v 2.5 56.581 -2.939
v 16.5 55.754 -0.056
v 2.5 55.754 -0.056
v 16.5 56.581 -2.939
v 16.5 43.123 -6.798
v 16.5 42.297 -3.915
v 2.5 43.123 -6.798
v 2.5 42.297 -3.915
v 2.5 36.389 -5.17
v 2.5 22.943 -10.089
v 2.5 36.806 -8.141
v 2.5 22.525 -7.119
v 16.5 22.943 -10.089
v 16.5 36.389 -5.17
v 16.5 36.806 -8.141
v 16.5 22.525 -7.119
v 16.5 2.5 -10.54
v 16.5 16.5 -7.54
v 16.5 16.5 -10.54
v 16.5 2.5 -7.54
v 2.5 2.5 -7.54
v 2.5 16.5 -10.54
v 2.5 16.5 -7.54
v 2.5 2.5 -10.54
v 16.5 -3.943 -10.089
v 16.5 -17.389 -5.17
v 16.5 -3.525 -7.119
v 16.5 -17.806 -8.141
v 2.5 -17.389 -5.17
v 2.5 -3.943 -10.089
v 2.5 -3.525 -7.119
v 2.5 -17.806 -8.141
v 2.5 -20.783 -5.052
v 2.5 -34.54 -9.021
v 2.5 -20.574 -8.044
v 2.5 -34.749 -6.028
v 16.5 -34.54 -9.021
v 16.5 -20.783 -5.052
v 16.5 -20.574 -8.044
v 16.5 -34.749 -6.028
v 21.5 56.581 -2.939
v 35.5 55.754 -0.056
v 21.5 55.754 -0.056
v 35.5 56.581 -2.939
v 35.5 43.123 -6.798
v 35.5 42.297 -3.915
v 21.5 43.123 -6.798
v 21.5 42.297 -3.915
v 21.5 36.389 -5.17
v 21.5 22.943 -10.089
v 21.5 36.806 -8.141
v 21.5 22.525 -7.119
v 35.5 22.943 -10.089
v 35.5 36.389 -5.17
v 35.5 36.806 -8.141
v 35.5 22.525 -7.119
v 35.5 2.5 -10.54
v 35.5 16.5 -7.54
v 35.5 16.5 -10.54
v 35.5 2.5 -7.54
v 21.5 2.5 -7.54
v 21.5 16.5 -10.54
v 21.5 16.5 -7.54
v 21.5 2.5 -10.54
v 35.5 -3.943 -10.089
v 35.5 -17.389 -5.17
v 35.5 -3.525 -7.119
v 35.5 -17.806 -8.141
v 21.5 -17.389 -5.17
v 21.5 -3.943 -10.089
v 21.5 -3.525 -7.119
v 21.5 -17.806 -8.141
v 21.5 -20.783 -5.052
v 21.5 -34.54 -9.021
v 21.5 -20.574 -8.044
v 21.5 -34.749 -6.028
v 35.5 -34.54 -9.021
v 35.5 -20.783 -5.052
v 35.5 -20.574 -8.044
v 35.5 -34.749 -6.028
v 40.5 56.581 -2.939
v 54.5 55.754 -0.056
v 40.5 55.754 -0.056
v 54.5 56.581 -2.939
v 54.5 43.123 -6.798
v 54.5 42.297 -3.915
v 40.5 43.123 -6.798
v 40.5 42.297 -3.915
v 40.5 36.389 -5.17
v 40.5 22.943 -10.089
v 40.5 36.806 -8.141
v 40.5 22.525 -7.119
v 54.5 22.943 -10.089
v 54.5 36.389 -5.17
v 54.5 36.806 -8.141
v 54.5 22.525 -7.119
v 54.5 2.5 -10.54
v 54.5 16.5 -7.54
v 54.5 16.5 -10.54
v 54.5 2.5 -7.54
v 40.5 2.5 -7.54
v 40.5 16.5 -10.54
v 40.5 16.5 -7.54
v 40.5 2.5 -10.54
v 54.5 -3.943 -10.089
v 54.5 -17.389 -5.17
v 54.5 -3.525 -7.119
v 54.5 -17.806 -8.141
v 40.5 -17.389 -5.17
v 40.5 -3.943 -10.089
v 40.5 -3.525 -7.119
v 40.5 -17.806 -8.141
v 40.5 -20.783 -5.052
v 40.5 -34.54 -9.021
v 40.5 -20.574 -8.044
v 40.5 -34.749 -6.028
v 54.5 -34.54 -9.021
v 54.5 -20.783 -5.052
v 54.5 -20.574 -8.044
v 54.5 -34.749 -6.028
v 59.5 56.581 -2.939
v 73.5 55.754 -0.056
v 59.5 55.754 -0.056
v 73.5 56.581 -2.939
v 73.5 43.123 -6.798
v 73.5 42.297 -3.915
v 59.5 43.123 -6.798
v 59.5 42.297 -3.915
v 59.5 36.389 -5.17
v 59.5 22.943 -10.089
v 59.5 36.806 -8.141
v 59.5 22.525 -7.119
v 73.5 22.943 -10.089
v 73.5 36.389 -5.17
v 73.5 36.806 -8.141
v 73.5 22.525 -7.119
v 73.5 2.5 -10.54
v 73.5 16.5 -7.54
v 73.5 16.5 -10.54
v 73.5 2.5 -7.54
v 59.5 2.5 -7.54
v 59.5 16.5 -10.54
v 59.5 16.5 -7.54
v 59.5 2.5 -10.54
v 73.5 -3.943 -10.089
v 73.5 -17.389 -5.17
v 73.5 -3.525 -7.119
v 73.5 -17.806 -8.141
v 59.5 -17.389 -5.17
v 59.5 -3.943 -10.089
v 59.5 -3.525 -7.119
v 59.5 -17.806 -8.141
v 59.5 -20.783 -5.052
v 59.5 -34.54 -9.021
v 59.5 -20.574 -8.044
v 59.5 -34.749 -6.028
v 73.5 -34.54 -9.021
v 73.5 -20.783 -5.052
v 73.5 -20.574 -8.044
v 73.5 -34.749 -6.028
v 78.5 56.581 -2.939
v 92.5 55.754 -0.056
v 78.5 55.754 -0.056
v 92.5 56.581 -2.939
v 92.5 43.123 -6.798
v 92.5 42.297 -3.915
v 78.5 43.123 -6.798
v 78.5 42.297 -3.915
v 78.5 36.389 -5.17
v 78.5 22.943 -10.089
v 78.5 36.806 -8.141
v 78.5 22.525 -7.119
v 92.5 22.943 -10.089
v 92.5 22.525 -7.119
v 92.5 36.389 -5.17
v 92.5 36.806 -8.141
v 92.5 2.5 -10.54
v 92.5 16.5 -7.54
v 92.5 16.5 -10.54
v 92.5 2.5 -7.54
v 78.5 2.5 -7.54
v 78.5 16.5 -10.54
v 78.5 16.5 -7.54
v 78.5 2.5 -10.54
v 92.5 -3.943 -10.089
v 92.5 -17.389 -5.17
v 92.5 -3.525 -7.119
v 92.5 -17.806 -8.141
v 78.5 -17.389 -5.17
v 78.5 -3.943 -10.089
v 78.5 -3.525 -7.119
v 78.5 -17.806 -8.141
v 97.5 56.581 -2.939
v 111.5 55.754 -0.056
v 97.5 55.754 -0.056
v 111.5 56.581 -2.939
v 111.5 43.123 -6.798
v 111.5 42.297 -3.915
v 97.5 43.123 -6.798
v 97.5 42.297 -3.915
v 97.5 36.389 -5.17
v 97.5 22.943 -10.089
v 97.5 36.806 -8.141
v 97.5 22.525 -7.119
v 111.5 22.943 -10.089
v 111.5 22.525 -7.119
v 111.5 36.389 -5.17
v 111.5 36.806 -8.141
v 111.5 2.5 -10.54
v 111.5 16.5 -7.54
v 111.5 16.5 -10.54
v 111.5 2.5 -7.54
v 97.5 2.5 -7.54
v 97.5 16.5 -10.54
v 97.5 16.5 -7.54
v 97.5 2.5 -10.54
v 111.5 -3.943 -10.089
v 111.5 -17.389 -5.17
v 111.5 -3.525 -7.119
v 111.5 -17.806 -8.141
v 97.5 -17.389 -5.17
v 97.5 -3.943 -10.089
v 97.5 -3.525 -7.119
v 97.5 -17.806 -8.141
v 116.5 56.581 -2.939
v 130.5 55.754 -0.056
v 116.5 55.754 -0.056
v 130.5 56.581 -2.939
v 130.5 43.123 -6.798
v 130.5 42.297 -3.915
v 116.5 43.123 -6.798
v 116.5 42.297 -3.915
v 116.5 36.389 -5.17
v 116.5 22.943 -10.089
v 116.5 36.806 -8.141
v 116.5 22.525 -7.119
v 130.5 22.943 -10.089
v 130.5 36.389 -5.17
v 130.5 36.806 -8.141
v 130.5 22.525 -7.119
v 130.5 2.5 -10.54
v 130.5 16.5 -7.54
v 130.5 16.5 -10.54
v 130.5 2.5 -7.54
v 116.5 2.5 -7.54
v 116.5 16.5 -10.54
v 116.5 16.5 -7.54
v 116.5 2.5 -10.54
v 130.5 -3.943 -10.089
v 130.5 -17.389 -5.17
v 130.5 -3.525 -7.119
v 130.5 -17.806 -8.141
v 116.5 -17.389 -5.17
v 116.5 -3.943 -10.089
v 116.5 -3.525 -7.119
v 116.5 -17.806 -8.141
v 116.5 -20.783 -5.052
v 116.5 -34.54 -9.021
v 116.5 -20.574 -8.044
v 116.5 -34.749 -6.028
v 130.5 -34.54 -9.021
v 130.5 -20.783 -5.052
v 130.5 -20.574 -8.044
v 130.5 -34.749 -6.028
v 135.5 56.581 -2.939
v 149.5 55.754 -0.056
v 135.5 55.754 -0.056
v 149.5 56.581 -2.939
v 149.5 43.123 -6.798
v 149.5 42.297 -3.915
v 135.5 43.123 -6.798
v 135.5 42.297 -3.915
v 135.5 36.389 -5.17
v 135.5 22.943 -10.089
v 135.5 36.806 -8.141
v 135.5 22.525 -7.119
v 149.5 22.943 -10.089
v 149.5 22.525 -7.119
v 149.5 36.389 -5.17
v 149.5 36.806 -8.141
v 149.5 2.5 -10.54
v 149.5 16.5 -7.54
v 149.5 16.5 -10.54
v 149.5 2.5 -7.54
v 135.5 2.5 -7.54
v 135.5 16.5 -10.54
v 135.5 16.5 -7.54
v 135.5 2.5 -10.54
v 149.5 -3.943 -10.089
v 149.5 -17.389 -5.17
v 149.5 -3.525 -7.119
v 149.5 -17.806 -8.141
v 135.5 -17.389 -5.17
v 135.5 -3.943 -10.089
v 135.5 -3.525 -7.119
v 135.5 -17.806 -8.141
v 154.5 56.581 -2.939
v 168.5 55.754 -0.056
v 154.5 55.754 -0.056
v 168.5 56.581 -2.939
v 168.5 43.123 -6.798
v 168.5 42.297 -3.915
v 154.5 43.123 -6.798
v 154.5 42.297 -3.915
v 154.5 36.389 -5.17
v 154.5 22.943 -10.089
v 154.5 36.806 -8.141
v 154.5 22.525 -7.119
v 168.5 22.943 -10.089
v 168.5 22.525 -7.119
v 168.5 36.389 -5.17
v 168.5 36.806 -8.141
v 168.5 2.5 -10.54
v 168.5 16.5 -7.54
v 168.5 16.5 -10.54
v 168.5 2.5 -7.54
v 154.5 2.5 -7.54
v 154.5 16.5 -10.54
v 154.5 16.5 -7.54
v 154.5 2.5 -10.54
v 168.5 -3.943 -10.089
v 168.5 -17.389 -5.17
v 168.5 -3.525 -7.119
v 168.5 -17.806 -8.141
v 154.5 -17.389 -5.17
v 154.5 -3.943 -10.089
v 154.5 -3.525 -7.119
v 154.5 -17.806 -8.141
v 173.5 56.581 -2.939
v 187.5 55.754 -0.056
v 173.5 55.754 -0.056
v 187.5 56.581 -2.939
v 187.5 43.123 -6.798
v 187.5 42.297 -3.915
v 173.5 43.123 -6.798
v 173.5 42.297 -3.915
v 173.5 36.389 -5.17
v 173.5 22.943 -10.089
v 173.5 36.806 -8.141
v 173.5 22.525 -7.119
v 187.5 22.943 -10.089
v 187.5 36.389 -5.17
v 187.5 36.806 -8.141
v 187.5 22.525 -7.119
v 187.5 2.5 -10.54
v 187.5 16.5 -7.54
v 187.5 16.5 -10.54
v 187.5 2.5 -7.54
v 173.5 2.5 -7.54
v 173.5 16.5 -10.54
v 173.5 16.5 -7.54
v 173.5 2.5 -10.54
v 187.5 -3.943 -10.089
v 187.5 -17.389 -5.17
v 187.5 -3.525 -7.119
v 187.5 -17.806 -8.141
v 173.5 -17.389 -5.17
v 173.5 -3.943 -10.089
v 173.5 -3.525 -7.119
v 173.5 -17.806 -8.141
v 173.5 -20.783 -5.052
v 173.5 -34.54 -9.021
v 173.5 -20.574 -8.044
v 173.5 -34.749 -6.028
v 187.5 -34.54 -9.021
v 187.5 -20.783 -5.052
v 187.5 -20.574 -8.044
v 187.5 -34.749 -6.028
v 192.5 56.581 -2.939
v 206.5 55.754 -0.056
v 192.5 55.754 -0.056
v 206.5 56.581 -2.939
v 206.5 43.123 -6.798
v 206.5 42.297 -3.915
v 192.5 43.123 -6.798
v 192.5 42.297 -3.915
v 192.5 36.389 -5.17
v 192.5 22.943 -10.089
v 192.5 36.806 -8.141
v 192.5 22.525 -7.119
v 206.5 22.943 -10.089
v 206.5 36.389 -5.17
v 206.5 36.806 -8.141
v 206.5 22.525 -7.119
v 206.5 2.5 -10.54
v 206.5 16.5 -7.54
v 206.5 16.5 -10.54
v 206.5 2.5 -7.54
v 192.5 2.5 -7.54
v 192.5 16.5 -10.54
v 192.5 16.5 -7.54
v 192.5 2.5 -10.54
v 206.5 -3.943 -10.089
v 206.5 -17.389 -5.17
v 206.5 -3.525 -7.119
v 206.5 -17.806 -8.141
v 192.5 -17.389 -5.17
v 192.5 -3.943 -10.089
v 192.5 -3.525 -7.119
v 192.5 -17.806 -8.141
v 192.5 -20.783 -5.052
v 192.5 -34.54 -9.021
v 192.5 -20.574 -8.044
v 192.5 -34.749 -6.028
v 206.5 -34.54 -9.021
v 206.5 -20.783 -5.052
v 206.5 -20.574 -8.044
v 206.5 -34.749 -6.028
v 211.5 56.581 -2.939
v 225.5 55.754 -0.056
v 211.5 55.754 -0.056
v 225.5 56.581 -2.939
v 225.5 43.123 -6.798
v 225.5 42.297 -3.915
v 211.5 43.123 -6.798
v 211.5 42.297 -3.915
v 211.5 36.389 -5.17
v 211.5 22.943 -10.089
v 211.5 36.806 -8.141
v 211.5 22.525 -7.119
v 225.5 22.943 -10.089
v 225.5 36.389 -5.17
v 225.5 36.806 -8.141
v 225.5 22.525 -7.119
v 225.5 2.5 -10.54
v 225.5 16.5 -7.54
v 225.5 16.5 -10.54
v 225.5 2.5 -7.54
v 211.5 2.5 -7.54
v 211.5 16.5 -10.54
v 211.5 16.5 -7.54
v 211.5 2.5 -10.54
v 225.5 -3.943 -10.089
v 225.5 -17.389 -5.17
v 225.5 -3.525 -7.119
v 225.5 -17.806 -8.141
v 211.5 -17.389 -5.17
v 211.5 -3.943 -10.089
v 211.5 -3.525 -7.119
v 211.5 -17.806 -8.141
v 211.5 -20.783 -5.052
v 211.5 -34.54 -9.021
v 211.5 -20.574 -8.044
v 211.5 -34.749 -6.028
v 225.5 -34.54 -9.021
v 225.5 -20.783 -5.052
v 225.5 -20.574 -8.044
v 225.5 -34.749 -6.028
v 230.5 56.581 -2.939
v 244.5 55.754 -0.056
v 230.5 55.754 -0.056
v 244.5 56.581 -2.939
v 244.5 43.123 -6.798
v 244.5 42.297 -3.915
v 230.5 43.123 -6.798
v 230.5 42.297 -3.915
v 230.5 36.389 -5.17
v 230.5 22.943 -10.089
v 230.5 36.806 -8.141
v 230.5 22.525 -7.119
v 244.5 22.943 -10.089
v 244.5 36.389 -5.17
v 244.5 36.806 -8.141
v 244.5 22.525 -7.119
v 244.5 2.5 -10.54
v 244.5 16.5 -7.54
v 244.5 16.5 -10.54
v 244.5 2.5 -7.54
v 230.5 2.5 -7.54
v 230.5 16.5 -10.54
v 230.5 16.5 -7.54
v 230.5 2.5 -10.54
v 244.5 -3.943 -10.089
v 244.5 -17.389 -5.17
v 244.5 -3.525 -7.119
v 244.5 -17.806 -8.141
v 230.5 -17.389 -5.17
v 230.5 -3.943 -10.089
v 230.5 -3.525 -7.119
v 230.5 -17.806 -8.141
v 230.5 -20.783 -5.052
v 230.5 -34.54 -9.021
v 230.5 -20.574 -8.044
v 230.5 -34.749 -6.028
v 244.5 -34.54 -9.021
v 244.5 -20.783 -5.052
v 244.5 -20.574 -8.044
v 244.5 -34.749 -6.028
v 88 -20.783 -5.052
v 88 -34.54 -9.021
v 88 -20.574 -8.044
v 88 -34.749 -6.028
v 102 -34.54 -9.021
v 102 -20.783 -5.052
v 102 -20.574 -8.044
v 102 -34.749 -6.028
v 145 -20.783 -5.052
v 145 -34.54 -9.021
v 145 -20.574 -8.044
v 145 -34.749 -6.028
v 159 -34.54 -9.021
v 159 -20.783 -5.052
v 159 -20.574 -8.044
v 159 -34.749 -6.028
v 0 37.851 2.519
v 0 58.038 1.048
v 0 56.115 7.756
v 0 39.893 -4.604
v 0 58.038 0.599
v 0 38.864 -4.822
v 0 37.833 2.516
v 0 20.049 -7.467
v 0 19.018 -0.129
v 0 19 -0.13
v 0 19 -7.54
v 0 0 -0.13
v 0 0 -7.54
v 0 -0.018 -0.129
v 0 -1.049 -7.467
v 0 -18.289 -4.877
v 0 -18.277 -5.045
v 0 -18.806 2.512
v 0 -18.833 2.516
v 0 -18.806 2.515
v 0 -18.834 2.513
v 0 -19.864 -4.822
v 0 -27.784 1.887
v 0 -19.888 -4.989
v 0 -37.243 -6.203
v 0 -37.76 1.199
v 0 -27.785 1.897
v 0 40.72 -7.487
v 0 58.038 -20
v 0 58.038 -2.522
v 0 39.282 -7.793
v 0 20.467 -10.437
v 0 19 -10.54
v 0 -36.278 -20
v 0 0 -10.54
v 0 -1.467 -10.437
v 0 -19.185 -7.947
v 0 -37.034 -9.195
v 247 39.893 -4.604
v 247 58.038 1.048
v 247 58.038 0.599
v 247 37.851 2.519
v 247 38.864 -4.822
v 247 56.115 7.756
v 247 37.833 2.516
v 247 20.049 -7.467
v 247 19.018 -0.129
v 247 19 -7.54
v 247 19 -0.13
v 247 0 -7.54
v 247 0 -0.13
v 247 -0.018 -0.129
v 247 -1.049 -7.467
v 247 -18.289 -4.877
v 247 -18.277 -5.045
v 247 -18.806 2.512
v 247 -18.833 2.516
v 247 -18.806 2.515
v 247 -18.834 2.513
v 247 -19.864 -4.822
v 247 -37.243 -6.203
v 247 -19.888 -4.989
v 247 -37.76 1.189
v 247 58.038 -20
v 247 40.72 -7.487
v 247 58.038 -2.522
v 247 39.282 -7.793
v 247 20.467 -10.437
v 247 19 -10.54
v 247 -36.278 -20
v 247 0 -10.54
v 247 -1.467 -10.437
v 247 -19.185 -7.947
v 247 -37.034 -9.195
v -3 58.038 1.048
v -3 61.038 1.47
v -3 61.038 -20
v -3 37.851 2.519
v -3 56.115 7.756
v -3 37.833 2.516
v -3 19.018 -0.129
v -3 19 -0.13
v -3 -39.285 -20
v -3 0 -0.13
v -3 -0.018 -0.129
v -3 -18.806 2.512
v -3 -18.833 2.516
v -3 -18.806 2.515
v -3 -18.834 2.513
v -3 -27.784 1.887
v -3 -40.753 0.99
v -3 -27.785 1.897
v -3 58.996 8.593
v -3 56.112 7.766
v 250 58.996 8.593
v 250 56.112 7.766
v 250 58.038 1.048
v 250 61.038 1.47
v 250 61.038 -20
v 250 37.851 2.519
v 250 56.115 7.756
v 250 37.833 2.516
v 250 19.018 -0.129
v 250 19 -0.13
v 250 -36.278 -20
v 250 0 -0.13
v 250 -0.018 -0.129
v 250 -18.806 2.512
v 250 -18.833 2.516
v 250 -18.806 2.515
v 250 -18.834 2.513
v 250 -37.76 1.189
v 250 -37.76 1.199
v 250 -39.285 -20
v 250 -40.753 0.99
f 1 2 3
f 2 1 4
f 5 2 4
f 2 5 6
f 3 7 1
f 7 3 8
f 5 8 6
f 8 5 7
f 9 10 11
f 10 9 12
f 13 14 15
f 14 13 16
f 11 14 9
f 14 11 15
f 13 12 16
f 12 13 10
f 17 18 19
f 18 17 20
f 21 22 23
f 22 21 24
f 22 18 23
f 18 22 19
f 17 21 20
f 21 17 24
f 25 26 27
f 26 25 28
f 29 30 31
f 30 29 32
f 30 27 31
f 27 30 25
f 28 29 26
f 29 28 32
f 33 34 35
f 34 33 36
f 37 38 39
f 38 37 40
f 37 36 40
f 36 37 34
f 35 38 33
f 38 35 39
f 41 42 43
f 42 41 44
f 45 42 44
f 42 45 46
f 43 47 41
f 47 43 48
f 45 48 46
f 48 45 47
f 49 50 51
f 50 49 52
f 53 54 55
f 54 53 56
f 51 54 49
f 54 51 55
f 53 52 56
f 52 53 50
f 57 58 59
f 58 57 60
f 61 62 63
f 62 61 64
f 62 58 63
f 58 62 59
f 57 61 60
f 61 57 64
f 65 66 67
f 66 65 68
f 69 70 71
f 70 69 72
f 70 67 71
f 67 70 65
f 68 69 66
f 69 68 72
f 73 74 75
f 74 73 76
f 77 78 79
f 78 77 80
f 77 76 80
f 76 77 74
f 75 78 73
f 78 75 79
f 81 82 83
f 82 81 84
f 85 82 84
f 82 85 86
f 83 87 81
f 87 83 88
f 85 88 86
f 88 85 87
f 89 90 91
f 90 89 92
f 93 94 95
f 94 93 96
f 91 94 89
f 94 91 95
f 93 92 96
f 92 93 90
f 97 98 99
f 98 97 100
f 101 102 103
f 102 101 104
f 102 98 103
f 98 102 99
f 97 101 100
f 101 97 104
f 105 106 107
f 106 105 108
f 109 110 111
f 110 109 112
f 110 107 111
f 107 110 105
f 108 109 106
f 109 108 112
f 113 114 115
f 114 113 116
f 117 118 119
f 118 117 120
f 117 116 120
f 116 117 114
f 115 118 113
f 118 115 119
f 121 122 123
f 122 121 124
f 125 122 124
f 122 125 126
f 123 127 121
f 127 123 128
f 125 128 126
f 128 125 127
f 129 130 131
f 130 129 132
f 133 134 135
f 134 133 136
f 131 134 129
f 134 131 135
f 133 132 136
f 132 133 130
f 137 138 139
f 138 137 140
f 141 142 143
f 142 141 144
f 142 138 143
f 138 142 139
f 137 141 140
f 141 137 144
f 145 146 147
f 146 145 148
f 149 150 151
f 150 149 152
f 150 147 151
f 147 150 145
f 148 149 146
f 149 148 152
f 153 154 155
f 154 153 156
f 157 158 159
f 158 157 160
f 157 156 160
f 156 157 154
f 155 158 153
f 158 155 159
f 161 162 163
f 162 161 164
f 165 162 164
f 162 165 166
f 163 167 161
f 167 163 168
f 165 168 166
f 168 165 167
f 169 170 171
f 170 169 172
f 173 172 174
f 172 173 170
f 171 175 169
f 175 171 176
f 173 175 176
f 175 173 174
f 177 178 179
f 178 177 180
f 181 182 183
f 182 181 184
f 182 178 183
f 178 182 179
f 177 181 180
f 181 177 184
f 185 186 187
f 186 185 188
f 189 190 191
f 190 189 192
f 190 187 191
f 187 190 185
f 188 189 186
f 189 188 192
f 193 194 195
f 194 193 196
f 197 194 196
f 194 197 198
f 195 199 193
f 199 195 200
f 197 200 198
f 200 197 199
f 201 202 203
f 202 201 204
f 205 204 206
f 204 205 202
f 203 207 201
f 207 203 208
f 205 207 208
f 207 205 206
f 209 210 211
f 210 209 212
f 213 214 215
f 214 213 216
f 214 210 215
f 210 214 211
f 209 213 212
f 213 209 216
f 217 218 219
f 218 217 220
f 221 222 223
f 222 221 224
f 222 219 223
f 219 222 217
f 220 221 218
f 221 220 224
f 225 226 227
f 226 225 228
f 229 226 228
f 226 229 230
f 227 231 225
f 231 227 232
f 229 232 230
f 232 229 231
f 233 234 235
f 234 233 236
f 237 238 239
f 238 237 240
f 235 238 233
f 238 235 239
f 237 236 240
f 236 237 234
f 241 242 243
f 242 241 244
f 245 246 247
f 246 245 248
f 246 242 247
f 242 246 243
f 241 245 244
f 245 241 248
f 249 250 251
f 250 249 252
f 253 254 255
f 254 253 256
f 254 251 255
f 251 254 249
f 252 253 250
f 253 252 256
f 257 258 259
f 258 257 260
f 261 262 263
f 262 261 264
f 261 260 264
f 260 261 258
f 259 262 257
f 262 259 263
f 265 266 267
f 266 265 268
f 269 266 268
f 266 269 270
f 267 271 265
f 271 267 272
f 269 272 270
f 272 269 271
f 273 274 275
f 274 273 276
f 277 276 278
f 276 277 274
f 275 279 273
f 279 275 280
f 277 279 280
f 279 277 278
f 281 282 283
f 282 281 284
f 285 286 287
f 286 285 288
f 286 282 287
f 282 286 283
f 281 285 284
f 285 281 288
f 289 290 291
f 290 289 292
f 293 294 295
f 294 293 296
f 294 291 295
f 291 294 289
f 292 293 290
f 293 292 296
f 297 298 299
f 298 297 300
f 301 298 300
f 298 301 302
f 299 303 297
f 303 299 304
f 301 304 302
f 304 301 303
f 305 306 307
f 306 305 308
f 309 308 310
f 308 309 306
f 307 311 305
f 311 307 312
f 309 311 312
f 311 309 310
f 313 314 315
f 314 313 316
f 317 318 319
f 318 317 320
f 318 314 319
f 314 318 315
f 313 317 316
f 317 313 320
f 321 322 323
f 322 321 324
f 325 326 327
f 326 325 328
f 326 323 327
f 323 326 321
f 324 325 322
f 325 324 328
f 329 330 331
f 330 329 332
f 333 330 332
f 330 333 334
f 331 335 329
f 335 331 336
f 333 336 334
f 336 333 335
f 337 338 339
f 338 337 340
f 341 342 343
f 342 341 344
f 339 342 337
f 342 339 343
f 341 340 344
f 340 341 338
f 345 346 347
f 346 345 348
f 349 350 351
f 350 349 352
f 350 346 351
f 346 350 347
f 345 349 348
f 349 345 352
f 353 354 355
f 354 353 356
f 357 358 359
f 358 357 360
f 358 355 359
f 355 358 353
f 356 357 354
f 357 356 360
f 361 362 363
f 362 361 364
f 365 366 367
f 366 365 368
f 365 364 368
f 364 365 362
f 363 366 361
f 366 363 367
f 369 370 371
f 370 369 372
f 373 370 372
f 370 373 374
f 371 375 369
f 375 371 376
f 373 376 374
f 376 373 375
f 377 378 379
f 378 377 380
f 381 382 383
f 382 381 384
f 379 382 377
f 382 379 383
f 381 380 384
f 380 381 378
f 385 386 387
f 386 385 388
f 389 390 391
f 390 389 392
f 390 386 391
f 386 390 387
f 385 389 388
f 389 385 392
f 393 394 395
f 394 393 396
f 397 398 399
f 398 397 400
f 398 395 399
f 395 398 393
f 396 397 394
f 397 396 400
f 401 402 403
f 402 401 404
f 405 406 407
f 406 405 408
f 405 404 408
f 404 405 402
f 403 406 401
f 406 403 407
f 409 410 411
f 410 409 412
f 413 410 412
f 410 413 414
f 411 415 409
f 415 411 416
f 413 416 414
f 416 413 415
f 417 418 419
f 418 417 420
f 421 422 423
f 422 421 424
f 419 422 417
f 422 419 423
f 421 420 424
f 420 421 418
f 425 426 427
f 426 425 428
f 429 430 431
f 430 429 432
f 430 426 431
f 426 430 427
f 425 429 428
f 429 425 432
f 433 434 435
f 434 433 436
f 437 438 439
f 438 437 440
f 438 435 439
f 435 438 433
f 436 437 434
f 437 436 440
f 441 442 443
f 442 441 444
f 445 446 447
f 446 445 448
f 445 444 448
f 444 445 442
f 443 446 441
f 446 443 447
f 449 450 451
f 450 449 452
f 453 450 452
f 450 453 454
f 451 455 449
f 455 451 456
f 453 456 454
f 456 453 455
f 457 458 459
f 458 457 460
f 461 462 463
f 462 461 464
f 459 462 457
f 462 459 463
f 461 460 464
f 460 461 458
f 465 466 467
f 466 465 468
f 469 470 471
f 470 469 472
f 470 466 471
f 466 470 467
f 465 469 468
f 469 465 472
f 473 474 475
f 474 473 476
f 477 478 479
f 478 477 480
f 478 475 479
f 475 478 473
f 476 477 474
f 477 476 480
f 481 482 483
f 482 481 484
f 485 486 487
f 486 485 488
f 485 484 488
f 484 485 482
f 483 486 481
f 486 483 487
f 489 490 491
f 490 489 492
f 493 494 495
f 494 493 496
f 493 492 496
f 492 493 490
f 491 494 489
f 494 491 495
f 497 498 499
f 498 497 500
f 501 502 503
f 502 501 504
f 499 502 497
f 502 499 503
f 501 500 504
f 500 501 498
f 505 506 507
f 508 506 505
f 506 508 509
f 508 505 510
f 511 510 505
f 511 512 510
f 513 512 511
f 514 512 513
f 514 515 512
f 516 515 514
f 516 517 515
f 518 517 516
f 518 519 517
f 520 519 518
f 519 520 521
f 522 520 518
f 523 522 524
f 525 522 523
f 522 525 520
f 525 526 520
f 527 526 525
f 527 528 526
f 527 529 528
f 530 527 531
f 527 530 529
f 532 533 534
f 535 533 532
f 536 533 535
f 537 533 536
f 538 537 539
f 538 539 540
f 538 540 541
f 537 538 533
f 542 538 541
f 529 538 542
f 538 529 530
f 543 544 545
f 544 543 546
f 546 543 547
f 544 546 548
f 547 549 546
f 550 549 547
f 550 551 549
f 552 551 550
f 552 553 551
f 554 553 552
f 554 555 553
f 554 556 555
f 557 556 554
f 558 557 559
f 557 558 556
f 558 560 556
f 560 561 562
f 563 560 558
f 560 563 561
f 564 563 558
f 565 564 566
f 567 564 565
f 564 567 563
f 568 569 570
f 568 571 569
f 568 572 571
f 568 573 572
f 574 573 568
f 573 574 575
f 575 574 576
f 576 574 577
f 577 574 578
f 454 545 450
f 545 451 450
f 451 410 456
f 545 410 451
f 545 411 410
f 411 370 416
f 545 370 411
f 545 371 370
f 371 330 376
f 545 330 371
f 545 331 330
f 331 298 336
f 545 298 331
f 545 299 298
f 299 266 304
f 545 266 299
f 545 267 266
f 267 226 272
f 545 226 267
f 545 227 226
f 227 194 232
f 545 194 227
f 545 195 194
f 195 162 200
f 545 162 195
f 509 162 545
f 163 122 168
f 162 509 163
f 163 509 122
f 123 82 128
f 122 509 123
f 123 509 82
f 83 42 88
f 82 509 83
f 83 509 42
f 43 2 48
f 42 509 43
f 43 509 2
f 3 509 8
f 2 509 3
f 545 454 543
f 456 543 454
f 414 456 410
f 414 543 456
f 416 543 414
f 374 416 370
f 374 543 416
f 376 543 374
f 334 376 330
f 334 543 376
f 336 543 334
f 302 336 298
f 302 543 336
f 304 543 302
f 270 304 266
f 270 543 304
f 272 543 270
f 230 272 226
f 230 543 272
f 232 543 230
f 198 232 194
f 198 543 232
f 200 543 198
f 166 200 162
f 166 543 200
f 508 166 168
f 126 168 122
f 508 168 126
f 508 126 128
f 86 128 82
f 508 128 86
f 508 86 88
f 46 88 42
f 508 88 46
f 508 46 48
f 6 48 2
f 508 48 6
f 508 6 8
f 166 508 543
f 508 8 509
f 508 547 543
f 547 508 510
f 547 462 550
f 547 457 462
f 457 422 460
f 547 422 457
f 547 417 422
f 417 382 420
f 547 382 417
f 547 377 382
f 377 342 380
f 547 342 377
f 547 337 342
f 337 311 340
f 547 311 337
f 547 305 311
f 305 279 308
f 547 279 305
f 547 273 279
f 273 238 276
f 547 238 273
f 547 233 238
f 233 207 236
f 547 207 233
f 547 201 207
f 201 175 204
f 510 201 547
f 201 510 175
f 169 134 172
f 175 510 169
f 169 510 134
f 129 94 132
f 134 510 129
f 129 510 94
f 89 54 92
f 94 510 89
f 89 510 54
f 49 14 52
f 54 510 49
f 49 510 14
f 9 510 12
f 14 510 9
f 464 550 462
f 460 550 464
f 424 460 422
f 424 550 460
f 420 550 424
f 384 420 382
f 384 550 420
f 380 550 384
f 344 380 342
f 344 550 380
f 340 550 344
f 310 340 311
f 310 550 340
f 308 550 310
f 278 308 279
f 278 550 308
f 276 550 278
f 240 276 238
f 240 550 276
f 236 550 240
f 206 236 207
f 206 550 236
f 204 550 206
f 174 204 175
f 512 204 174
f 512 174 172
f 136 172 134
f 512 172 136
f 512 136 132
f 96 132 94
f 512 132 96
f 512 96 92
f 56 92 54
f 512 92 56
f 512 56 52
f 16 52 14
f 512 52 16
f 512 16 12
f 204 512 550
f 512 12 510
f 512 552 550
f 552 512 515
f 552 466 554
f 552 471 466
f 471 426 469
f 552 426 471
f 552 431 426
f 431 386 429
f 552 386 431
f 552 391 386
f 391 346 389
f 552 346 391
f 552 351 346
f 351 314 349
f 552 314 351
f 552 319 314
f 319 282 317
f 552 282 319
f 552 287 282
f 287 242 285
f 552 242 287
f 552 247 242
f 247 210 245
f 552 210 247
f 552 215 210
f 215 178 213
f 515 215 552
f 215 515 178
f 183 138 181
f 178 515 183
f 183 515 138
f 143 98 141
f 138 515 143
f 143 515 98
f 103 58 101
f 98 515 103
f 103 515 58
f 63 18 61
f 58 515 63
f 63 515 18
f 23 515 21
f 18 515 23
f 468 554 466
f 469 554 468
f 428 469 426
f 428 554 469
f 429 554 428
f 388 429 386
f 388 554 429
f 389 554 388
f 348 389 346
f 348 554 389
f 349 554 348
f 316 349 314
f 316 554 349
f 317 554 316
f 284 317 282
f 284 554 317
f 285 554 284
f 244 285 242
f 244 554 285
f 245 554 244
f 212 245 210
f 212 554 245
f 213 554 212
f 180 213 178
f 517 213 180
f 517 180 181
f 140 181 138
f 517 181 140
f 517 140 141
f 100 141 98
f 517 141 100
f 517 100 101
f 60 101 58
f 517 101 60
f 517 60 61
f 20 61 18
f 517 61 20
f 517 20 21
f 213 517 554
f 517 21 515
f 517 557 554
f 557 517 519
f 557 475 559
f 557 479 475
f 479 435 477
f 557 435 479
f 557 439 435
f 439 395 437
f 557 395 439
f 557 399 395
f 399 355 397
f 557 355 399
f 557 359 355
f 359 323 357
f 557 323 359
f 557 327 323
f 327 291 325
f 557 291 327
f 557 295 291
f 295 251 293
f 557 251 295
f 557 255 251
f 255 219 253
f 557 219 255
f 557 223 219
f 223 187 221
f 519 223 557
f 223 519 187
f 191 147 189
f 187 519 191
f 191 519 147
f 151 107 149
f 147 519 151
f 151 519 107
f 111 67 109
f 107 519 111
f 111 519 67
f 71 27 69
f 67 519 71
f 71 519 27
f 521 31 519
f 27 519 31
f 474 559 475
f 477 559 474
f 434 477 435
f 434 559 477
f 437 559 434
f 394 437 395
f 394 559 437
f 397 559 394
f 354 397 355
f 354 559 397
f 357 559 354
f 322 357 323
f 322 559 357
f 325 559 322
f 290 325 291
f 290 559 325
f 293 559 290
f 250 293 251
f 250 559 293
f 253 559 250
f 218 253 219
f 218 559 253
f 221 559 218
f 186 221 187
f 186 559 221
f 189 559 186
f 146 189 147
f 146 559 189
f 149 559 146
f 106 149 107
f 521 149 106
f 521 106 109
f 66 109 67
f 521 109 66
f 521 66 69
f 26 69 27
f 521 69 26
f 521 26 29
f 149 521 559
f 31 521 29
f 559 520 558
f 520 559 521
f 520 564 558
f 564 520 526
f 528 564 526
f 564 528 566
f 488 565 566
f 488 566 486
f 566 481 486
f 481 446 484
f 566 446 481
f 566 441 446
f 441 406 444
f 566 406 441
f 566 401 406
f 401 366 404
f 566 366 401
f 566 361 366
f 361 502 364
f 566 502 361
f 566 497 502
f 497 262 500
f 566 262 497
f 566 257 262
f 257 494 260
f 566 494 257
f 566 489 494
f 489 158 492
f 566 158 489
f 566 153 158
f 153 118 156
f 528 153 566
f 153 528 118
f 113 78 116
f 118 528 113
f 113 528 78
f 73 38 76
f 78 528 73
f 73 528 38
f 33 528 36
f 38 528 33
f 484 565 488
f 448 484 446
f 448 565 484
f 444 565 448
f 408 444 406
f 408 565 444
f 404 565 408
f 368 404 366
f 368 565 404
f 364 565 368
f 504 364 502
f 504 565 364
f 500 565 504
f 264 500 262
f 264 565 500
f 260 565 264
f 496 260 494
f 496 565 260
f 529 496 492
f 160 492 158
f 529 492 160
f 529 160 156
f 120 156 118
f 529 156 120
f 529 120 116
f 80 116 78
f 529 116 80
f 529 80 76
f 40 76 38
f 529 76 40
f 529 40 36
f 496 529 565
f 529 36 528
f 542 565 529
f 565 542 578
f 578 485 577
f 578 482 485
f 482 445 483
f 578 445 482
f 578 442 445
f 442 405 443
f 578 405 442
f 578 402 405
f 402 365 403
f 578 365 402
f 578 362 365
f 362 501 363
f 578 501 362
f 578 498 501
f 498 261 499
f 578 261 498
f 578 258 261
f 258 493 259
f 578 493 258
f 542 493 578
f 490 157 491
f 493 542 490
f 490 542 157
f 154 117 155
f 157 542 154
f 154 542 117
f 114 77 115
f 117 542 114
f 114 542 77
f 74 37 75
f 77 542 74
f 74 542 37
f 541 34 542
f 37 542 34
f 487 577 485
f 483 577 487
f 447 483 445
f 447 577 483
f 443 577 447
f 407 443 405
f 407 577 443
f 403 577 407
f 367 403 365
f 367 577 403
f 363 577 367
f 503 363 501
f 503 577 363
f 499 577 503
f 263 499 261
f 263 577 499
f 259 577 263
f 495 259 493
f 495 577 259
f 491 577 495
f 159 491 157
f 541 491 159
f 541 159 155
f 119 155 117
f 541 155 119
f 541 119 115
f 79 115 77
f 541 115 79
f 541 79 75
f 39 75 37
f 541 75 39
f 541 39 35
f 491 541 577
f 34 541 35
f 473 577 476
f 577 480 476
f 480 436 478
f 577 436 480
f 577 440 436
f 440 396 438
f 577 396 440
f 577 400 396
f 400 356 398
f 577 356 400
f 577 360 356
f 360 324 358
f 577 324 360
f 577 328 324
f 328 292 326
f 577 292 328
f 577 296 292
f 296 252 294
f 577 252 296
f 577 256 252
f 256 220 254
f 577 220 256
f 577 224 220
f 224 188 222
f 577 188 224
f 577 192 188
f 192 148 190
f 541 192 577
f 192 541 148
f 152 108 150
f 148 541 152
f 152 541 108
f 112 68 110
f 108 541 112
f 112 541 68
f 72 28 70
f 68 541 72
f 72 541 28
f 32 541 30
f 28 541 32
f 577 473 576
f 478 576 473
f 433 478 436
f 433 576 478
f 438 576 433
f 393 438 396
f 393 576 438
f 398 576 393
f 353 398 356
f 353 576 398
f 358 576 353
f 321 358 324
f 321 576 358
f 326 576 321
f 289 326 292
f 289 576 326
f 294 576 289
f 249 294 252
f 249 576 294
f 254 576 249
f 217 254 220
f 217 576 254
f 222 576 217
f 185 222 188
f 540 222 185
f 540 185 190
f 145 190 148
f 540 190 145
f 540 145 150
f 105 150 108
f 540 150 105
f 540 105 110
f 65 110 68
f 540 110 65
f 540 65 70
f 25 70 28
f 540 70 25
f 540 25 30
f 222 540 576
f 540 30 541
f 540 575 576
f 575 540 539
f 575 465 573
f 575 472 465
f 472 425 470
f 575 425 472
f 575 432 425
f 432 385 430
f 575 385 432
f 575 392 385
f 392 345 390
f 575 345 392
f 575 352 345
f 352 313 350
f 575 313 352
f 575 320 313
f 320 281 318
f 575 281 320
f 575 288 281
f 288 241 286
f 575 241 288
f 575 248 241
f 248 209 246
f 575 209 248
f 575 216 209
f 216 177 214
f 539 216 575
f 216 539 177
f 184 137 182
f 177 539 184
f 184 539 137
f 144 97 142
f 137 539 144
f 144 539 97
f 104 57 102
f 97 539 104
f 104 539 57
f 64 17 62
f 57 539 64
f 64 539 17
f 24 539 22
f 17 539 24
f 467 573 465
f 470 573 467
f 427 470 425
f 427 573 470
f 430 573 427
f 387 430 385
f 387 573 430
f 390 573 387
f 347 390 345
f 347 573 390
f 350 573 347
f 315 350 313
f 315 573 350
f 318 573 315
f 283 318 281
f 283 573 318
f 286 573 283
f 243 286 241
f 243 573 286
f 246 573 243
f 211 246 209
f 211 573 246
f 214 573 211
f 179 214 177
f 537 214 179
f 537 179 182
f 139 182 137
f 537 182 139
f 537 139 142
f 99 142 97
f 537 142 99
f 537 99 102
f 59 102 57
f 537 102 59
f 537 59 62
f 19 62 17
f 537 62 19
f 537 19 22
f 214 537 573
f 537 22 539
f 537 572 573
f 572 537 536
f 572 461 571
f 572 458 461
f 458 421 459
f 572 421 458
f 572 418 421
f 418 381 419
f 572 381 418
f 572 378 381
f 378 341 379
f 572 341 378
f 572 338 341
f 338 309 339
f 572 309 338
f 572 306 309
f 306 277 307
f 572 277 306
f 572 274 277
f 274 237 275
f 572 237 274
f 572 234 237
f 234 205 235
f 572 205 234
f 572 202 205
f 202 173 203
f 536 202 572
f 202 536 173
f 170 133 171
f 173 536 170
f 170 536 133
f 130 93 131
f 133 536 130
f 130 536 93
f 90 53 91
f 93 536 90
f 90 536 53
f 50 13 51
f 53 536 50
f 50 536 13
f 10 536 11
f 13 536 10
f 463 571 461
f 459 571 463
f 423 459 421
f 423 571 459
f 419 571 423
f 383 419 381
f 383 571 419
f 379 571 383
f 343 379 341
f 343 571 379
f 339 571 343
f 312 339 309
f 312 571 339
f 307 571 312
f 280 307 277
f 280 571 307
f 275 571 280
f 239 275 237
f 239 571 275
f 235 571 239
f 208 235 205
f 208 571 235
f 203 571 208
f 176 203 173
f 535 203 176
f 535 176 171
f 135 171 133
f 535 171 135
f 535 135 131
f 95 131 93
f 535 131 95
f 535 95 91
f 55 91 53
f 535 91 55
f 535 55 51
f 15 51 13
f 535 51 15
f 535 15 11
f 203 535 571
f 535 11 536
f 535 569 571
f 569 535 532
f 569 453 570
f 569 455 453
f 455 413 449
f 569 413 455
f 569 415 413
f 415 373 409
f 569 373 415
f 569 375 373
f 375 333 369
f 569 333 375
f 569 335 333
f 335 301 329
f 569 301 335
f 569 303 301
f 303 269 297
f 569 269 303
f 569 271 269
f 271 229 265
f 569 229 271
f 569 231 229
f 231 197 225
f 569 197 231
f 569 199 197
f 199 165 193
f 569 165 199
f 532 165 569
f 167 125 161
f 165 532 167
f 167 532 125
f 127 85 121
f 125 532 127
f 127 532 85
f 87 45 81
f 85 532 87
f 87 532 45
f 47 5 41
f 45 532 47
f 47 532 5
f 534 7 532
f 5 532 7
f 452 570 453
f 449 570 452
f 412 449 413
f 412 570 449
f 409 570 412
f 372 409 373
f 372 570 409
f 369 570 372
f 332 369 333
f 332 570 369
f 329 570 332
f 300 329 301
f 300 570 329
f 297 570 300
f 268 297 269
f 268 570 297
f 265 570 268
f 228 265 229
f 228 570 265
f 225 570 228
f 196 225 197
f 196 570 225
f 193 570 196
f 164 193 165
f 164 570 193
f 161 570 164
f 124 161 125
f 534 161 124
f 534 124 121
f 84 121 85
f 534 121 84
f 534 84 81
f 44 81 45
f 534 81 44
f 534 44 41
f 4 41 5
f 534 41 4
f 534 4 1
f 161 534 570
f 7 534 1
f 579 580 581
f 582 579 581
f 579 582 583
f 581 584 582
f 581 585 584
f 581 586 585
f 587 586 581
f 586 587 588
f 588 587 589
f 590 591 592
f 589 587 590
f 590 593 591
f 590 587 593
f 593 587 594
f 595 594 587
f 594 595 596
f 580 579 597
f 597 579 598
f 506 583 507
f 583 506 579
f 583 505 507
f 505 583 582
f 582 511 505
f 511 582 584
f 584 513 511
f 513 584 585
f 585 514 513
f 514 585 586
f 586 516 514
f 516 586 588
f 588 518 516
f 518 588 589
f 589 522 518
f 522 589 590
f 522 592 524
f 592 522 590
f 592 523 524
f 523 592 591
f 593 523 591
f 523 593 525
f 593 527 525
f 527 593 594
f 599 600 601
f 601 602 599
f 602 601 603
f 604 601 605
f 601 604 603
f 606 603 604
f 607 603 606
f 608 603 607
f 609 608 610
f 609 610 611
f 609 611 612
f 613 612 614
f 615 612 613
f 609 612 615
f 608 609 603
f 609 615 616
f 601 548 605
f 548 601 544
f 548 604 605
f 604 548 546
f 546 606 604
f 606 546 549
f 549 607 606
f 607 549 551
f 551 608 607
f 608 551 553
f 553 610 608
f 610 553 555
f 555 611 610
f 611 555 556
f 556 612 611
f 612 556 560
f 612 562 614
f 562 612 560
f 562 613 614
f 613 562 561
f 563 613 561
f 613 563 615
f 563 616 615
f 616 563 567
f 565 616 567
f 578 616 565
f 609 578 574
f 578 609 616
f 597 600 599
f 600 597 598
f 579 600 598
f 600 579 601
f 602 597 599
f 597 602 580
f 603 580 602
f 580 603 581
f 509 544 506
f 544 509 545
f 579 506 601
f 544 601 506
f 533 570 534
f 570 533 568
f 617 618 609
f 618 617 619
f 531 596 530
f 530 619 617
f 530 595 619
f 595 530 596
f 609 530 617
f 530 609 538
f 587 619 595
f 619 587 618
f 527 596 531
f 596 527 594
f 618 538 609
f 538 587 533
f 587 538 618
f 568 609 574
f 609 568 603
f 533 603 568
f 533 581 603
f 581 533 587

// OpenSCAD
$fn = 20;
renderSwitches = false;

outWidth = 19;
inWidth = 14;
angle = 8;
thickness = 3;
height = 11;

numColumns = 13;
numRows = 5;

switchPlateToKeyCapDist = 7.41;
switchBottomToKeyCapDist = 14.1;
switchBottomToPlateDist = switchBottomToKeyCapDist - switchPlateToKeyCapDist;
//switchPlateTo
verticalWallOffset = 0.12;
thumbOffset = 0;

//middlePlateHeight = 10;
middlePlateHeight = 9;
proMicroCaddyX = outWidth * (numColumns - 2.5);
proMicroCaddyWidth = 30;
proMicroPortHoleWidth = 3;
proMicroPortHoleLength = 21;
proMicroPortHoleHeight = 8;
proMicroPortOffset = 1.5;

bottomPlateHeight = 1;

bottomRowAngleMult = 1.5;

bottomWallOffset = 0.53;

//height + middle + bottom = 22(?)


keyRow3Trans = identityMatrix();

keyRow2Trans = translationMatrix(0, outWidth, 0) * xRotMatrix(angle);
keyRow1Trans = keyRow2Trans * translationMatrix(0, outWidth, 0) * xRotMatrix(angle);
    
keyRow4Trans = xRotMatrix(-angle) * translationMatrix(0, -outWidth, 0);
keyRow5Trans = keyRow4Trans * xRotMatrix(angle * bottomRowAngleMult) * translationMatrix(0, -outWidth, 0);

keyRowTransformations = [keyRow1Trans, keyRow2Trans, keyRow3Trans, keyRow4Trans, keyRow5Trans];


topCornerPos = keyRow1Trans * [0, outWidth + thickness, -switchPlateToKeyCapDist - verticalWallOffset, 1];
topCornerY = topCornerPos[1];
bottomCornerPos = keyRow5Trans * [0, 0, 0, 1];
bottomCornerY = bottomCornerPos[1];

innerKeyboardWidth = numColumns * outWidth;
innerKeyboardHeight = numRows * outWidth;

resetButtonOffset = 171;
resetButtonRadius = 3;
resetButtonHeight = 1;

screwHoleWidth = 1.3;
screwHoleBottomPlateWidth = 2.1;
screwHolePadding = 1;
topScrewHeight = thickness;

//translate([0, topCornerPos[1], topCornerPos[2]])
//cube(1);

//slicedKeyboard(-10, thickness + outWidth * 6 - 2.5 + 10);
//slicedKeyboard(thickness + outWidth * 6 - 2.5, 1000);


//proMicro();
//proMicroCaddy();
//


difference() {
    fullKeyboard();
    keyboardFloorCutter();
}


//resetButton();



//allSwitches("model");


//cuttableBottomFloor();

//keyboardWalls();



module cuttableBottomFloor() {
    projection(cut = true)
    translate([0, 0, height + middlePlateHeight + bottomPlateHeight / 2])
    keyboardFloor();
}


module resetButton() {
    translate([resetButtonOffset, topCornerY - thickness, -height - middlePlateHeight - resetButtonHeight + 0])
    rotate([0, 0, -90])
    import("button.stl", convexity=10);
}

module slicedKeyboard(offsetX, sliceWidth) {
    difference() {
        fullKeyboard();
        translate([offsetX, -500, -500])
        cube([sliceWidth, 1000, 1000]);
    }
    
    
}

module fullKeyboard() {
    union() {
    keyboardBase();
    keyboardWalls();
    //middleWalls();
    //screwHoles(screwHoleWidth, screwHolePadding, topScrewHeight, -height, 1, true);

    }
}

module keyboardFloor() {
    difference () {
        keyboardFloorBase();
        
        screwHoles(screwHoleBottomPlateWidth, screwHolePadding, 10, -height - middlePlateHeight - bottomPlateHeight - 5, 1, false, true);
        
        resetButton();

    }
}

module keyboardFloorBase() {
    topPos = keyRow1Trans * [0, outWidth + thickness, -switchPlateToKeyCapDist, 1];
    topY = topPos[1];
    echo(topY);
    bottomPos = keyRow5Trans * [0, 0, 0, 1];
    bottomY = bottomPos[1];
    echo(bottomY);
    
    width = numColumns * outWidth + thickness * 2;
    length = (topY - bottomY) + thickness;
    
    translate([-thickness, bottomY - thickness, - (height + middlePlateHeight + bottomPlateHeight)])
    cube([width, length, bottomPlateHeight]);
    
    //

}

module keyboardFloorCutter() {
    topPos = keyRow1Trans * [0, outWidth + thickness, -switchPlateToKeyCapDist, 1];
    topY = topPos[1];
    echo(topY);
    bottomPos = keyRow5Trans * [0, 0, 0, 1];
    bottomY = bottomPos[1];
    echo(bottomY);
    
    width = numColumns * outWidth + thickness * 20;
    length = (topY - bottomY) + thickness * 10;
    
    cutHeight = bottomPlateHeight + 100;
    translate([-thickness - 5, bottomY - thickness, - (height + middlePlateHeight + cutHeight)])
    cube([width, length, cutHeight]);
    
    //

}





module middleWalls() {
    tol = 0.3;
    union() {
        difference() {
            middleWallsBase();
            
            translate([proMicroCaddyX - proMicroPortHoleLength / 2, topCornerY - thickness - tol / 2, -height - middlePlateHeight - tol])
                cube([proMicroPortHoleLength, proMicroPortHoleWidth + tol, proMicroPortHoleHeight + tol]);
        } 
        
    translate([proMicroCaddyX, topCornerY - thickness, -height - middlePlateHeight])
        import("promicro-port-hole.stl", convexity=10);
        
        screwHoles(screwHoleWidth, screwHolePadding,, middlePlateHeight, -height - middlePlateHeight, 1);
    }
    
}

module middleWallsBase() {
    translate([0, 0, -height - middlePlateHeight])
    linear_extrude(height=middlePlateHeight)
    projection(cut=true)
    translate([0, 0, height-0.01])
    keyboardWalls();
}

function screwHoleXYpositions(halfWidth, middleScrewOffsetY) = [
        [halfWidth, bottomCornerY + halfWidth],
        [halfWidth, topCornerY - thickness - halfWidth],
        [innerKeyboardWidth - halfWidth, bottomCornerY + halfWidth],
        [innerKeyboardWidth - halfWidth, topCornerY - thickness - halfWidth],
        [4 * outWidth, - middleScrewOffsetY],
        [9 * outWidth, - middleScrewOffsetY],
        [4 * outWidth, outWidth + middleScrewOffsetY],
        [9 * outWidth, outWidth + middleScrewOffsetY],
        [innerKeyboardWidth / 2, bottomCornerY + halfWidth],
        [innerKeyboardWidth / 2, topCornerY - thickness - halfWidth]
];

module screwHoles(radius, padding, screwHeight, screwZ, middleScrewOffsetY, middleScrewsOnly, cylindersOnly) {
    holeWidth = (screwHoleWidth + screwHolePadding) * 2;
    halfWidth = holeWidth / 2;
    
    realZ = screwZ + screwHeight / 2;
    
    screwXYpositions = screwHoleXYpositions(halfWidth, middleScrewOffsetY);
    
    //TODO: clean code!!!!
    if (cylindersOnly) {
        screwHolesHelper(screwXYpositions, 0, 9, radius, padding, screwHeight, realZ, "cylinder", holeWidth / 2);
    } else {
    
        if (middleScrewsOnly) {
            screwHolesHelper(screwXYpositions, 4, 7, radius, padding, screwHeight, realZ, "cube", 0);
        } else {
            screwHolesHelper(screwXYpositions, 0, 9, radius, padding, screwHeight, realZ, "hole", 0);
        }
    }
}

module screwHolesBak(radius, padding, screwHeight, screwZ, middleScrewOffsetY, middleScrewsOnly, cylindersOnly) {
    holeWidth = (radius + padding) * 2;
    
    screwXYpositions = [
        [0, bottomCornerY],
        [0, topCornerY - thickness - holeWidth],
        [innerKeyboardWidth - holeWidth, bottomCornerY],
        [innerKeyboardWidth - holeWidth, topCornerY - thickness - holeWidth],
        [4 * outWidth - holeWidth / 2, -holeWidth / 2 - middleScrewOffsetY],
        [9 * outWidth - holeWidth / 2, -holeWidth / 2 - middleScrewOffsetY],
        [4 * outWidth - holeWidth / 2, outWidth + -holeWidth / 2 + middleScrewOffsetY],
        [9 * outWidth - holeWidth / 2, outWidth + -holeWidth / 2 + middleScrewOffsetY],
        [innerKeyboardWidth / 2 - holeWidth / 2, bottomCornerY],
        [innerKeyboardWidth / 2 - holeWidth / 2, topCornerY - thickness - holeWidth],
    ];
    
    if (cylindersOnly) {
        screwHolesHelper(screwXYpositions, 0, 9, radius, padding, screwHeight, screwZ, "cylinder", holeWidth / 2);
    } else {
    
        if (middleScrewsOnly) {
            screwHolesHelper(screwXYpositions, 4, 7, radius, padding, screwHeight, screwZ, "cube", 0);
        } else {
            screwHolesHelper(screwXYpositions, 0, 9, radius, padding, screwHeight, screwZ, "hole", 0);
        }
    }
}

module screwHolesHelper(screwXYpositions, start, end, radius, padding, screwHeight, screwZ, type, offsetXY) {
    for ( i = [start : end] ) {
        x = screwXYpositions[i][0];
        y = screwXYpositions[i][1];
        //z = -height - middlePlateHeight;
        translate([x + 0, y + 0, screwZ])
        if (type == "hole") {
            screwHole(radius, padding, screwHeight);
        } else if (type == "cube") {
            cubeWidth = (radius + padding) * 2;
            cube([cubeWidth, cubeWidth, screwHeight], center = true);
        } else if (type == "cylinder") {
            cylinder(h = screwHeight, r = radius, center = true);
        }
    }
}

module screwHole(innerRadius, padding, height) {
    difference() {
        cubeWidth = (innerRadius + padding) * 2;
        cube([cubeWidth, cubeWidth, height], center = true);
        
        //translate([cubeWidth / 2, cubeWidth /2, -1])
        cylinder(h = height + 2, r = innerRadius, center = true);
    }
    
}

module proMicroCaddy() {
    translate([proMicroCaddyX, topCornerY - thickness, -(height + middlePlateHeight)])
    rotate([0, 0, 0])
    import("promicro-caddy.stl", convexity=10);
    //import("promicro.stl", convexity=10);
}

/*
module proMicro() {
    translate([proMicroPortX, 47, -16])
    rotate([0, -180, 90])
    //import("promicro-caddy.stl", convexity=10);
    import("promicro.stl", convexity=10);
}*/

/*
module proMicro() {
    translate([proMicroPortX, 59, -12.5])
    rotate([0, 0, 180])
    //import("promicro-caddy.stl", convexity=10);
    import("promicro.stl", convexity=10);
}*/


module proMicro() {
    translate([proMicroCaddyX, topCornerY - thickness + proMicroPortOffset, -(height + middlePlateHeight) + 0])
    //rotate([180, 0, 0])
    //import("promicro-caddy.stl", convexity=10);
    import("promicro.stl", convexity=10);
}

module keyboardWalls() {
    topOffset = [0, -outWidth - thickness, 0, 1] * keyRow1Trans;
    echo("top offset:");
    echo(topOffset[2]);
    //moveHeight = height - topOffset[2];
    moveHeight = height + 100;
    
    difference() {
        keyboardWallsUnsliced(height * 2);
        translate([-1000, -1000, -moveHeight - 100])
        cube([2000, 2000, 100]);
    }
}

module keyboardWallsUnsliced(height) {
    union() {
    placedSideWalls(height, switchPlateToKeyCapDist, switchBottomToKeyCapDist);
    placedTopWall(angle, numColumns * outWidth, switchPlateToKeyCapDist, height, verticalWallOffset, thickness);
    placedBottomWall(angle, numColumns * outWidth, height, verticalWallOffset);
    }
}

//extrudedSwitchArc(1);

module keyboardBase() {
    difference() {
        extrudedSwitchArc(numColumns);
        allSwitches("cutout");
    }
    if (renderSwitches) {
        allSwitches("model");
    }
}



module allSwitches(type) {
    switchRows(4, type, true);

    translate([outWidth * 4, 0, 0])
    switchRows(1, type, false);
    translate([outWidth * 5, 0, 0])
    switchRows(1, type, false);
    
    translate([outWidth * 4.5, 0, 0])
    placedThumbKey(angle, type);

    translate([outWidth * 6, 0, 0])
    switchRows(1, type, true);

    translate([outWidth * 7, 0, 0])
    switchRows(1, type, false);
    translate([outWidth * 8, 0, 0])
    switchRows(1, type, false);
    
    translate([outWidth * 7.5, 0, 0])
    placedThumbKey(angle, type);

    translate([outWidth * 9, 0, 0])
    switchRows(4, type, true);
}

//extrudedSwitchArc();

module switchRows(numRows, type, inclThumbKeys) {
    for ( i = [0 : numRows - 1] ) {
        translate([outWidth * i, 0, 0]) {
            switchColumn(angle, type, inclThumbKeys);
        }
    }
}

module extrudedSwitchArc(numColumns) {
    rotate([0, 90, 0])
    linear_extrude(height = numColumns * outWidth)
        switchArcPolygon(angle, thickness, 0);
    
    //projection(cut=true)
    //import("arc-base-3d-v3.stl", convexity=10);
}

module placedSideWalls(downThickness, upThickness, cutoffLength) {
    translate([-thickness, 0, 0])
        placedSideWall(downThickness, upThickness, cutoffLength);
    
    translate([numColumns * outWidth, 0, 0])
        placedSideWall(downThickness, upThickness, cutoffLength);
    
}

module placedSideWall(downThickness, upThickness, cutoffLength) {
    cutoffPoint = keyRow1Trans * [0, outWidth, -cutoffLength - verticalWallOffset, 1];
    
    difference() {
        rotate([0, 90, 0])
        linear_extrude(height = thickness)
        switchArcPolygon(angle, downThickness, upThickness);
        
        translate([-1, cutoffPoint[1], cutoffPoint[2] - downThickness])
        cube([thickness + 2, downThickness, downThickness]);
    }
}


module placedTopWall(angle, length, angledHeight, verticalHeight, off, thickness) {
    topTrasform = keyRow1Trans * translationMatrix(-thickness, outWidth, -angledHeight - off);
    
    multmatrix(topTrasform) {
        //translate([-thickness, outWidth, -angledHeight - off])
        cube([length + thickness * 2, thickness, angledHeight]);
    }
    
    offsetPoint = topTrasform * [0, thickness, 0, 1];
    
    translate([-thickness, offsetPoint[1] - thickness, offsetPoint[2] - verticalHeight])
    cube([length + thickness * 2, thickness, verticalHeight]);
    
    /*
    outerOffsetPoint = topTrasform * [0, thickness, 0, 1];
    innerOffsetPoint = topTrasform * [0, 0, 0, 1];
    
    fullVertHeight = verticalHeight + outerOffsetPoint[2] - innerOffsetPoint[2];
    translate([-thickness, outerOffsetPoint[1] - thickness, outerOffsetPoint[2] - fullVertHeight])
    cube([length + thickness * 2, thickness, fullVertHeight]);
    */
}

module placedBottomWall(angle, length, height, off) {
    
    /*
    translate([0, bottomWallOffset, 0])
    multmatrix(keyRow5Trans) {
        rotate([-angle * 0.5, 0, 0]) {
            translate([-thickness, -thickness, -height - off])
                cube([length + thickness * 2, thickness, height]);
            
            translate([-thickness, 0, -height - off])
                cube([thickness,10,height]);
            
            translate([-thickness + length + thickness, 0, -height - off])
                cube([thickness,10,height]);
        }
        //translate([-thickness, -thickness, -height - off])
        //        cube([length + thickness * 2, thickness, height]);
    }
    */
    multmatrix(keyRow5Trans) {
            translate([-thickness, -thickness, -height - off])
                cube([length + thickness * 2, thickness, height]);
            
            translate([-thickness, 0, -height - off])
                cube([thickness,10,height]);
            

        //translate([-thickness, -thickness, -height - off])
        //        cube([length + thickness * 2, thickness, height]);
    }

}

module placedThumbKey(angle, type) {
    multmatrix(keyRow5Trans)
        switch(type);
}


module switchColumn(angle, type, inclThumbKeys) {
    multmatrix(keyRow1Trans)
    switch(type);
    
    multmatrix(keyRow2Trans)
    switch(type);
    
    multmatrix(keyRow3Trans)
    switch(type);
    
    multmatrix(keyRow4Trans)
    switch(type);
    
    if (inclThumbKeys) {
        multmatrix(keyRow5Trans)
        switch(type);
    }
}

module switch(type) {
    if (type == "cutout") {
        switchCutout();
    }
    if (type == "model") {
        //switchCutout();
        import("keycap-template.stl", convexity=3);
    }
}

module switchCutout() {
    translate([outWidth/2 - inWidth/2, outWidth/2 - inWidth/2, -11])
    cube([inWidth, inWidth, 5]);
}

//TODO: fix thumb row intersecting badly when angle >20
module switchArcPolygon(angle, posThickness, negThickness) {
    thickness = posThickness + negThickness;
    //original transformation matricies are in terms of the yz plane, need to do everything along xy plane here
    YZtoXY = yRotMatrix(-90);
    YZsquarePoints = [
        [0, 0, 0, 1],
        [0, 0, thickness, 1],
        [0, outWidth, thickness, 1],
        [0, outWidth, 0, 1]
    ];
    
    rowTransformationsOriginal = [keyRow1Trans, keyRow2Trans, keyRow3Trans, keyRow4Trans, keyRow5Trans];

    //each "switch" needs to be moved down y axis a bit and rotated to fit on xy plane
    rowTransformations = [ for (i = [0:4])
        YZtoXY * rowTransformationsOriginal[i] * translationMatrix(0, 0, -7.54 - posThickness)
    ];
    
    
    //generate the points for each square representing a switch space
    for ( i = [0:numColumns - 1] ) {
        trans = rowTransformations[i];
        points = transformPoints(YZsquarePoints, 4, trans);
        polygon(points = flattenPointArray(points, 4, 0, 1));
    }
    
    //fill in the spaces between 2 squares by creating a polygon with their relevant points
    for ( i = [0:numColumns - 2] ) {
        rowATrans = rowTransformations[i];
        rowBTrans = rowTransformations[i + 1];
        
        rowAPoints = transformPoints(YZsquarePoints, 4, rowATrans);
        rowBPoints = transformPoints(YZsquarePoints, 4, rowBTrans);
        
        points = [rowAPoints[0], rowAPoints[1], rowBPoints[2], rowBPoints[3]];
        polygon(points = flattenPointArray(points, 4, 0, 1));
    }
    
}

function flattenPointArray(points, length, i1, i2) = 
[ for (i = [0:length-1]) 
    [points[i][i1], points[i][i2]]
];
    
function transformPoints(points, length, matrix) = 
[ for (i = [0:length-1])
    matrix * points[i]
];

function xRotMatrix(angle) = [
    [1, 0, 0, 0],
    [0, cos(angle), -sin(angle), 0],
    [0, sin(angle), cos(angle), 0],
    [0, 0, 0, 1]
];

function yRotMatrix(angle) = [
    [cos(angle), 0, sin(angle), 0],
    [0, 1, 0, 0],
    [-sin(angle), 0, cos(angle), 0],
    [0, 0, 0, 1]
];

function zRotMatrix(angle) = [
    [cos(angle), -sin(angle), 0, 0],
    [sin(angle), cos(angle), 0, 0],
    [0, 0, 1, 0],
    [0, 0, 0, 1]
];

function translationMatrix(tX, tY, tZ) = [
    [1, 0, 0, tX],
    [0, 1, 0, tY],
    [0, 0, 1, tZ],
    [0, 0, 0, 1]
];

function identityMatrix() = [
    [1, 0, 0, 0],
    [0, 1, 0, 0],
    [0, 0, 1, 0],
    [0, 0, 0, 1]
];


/*
module switchBase() {
    //import("keycap-template.stl", convexity=3);
    
    difference() {
    translate([0, 0, -7.7])
    cube([outWidth, outWidth, 0.817]);

    translate([outWidth/2 - inWidth/2, outWidth/2 - inWidth/2, -9])
    cube([inWidth, inWidth, 3]);
    }
}
*/
